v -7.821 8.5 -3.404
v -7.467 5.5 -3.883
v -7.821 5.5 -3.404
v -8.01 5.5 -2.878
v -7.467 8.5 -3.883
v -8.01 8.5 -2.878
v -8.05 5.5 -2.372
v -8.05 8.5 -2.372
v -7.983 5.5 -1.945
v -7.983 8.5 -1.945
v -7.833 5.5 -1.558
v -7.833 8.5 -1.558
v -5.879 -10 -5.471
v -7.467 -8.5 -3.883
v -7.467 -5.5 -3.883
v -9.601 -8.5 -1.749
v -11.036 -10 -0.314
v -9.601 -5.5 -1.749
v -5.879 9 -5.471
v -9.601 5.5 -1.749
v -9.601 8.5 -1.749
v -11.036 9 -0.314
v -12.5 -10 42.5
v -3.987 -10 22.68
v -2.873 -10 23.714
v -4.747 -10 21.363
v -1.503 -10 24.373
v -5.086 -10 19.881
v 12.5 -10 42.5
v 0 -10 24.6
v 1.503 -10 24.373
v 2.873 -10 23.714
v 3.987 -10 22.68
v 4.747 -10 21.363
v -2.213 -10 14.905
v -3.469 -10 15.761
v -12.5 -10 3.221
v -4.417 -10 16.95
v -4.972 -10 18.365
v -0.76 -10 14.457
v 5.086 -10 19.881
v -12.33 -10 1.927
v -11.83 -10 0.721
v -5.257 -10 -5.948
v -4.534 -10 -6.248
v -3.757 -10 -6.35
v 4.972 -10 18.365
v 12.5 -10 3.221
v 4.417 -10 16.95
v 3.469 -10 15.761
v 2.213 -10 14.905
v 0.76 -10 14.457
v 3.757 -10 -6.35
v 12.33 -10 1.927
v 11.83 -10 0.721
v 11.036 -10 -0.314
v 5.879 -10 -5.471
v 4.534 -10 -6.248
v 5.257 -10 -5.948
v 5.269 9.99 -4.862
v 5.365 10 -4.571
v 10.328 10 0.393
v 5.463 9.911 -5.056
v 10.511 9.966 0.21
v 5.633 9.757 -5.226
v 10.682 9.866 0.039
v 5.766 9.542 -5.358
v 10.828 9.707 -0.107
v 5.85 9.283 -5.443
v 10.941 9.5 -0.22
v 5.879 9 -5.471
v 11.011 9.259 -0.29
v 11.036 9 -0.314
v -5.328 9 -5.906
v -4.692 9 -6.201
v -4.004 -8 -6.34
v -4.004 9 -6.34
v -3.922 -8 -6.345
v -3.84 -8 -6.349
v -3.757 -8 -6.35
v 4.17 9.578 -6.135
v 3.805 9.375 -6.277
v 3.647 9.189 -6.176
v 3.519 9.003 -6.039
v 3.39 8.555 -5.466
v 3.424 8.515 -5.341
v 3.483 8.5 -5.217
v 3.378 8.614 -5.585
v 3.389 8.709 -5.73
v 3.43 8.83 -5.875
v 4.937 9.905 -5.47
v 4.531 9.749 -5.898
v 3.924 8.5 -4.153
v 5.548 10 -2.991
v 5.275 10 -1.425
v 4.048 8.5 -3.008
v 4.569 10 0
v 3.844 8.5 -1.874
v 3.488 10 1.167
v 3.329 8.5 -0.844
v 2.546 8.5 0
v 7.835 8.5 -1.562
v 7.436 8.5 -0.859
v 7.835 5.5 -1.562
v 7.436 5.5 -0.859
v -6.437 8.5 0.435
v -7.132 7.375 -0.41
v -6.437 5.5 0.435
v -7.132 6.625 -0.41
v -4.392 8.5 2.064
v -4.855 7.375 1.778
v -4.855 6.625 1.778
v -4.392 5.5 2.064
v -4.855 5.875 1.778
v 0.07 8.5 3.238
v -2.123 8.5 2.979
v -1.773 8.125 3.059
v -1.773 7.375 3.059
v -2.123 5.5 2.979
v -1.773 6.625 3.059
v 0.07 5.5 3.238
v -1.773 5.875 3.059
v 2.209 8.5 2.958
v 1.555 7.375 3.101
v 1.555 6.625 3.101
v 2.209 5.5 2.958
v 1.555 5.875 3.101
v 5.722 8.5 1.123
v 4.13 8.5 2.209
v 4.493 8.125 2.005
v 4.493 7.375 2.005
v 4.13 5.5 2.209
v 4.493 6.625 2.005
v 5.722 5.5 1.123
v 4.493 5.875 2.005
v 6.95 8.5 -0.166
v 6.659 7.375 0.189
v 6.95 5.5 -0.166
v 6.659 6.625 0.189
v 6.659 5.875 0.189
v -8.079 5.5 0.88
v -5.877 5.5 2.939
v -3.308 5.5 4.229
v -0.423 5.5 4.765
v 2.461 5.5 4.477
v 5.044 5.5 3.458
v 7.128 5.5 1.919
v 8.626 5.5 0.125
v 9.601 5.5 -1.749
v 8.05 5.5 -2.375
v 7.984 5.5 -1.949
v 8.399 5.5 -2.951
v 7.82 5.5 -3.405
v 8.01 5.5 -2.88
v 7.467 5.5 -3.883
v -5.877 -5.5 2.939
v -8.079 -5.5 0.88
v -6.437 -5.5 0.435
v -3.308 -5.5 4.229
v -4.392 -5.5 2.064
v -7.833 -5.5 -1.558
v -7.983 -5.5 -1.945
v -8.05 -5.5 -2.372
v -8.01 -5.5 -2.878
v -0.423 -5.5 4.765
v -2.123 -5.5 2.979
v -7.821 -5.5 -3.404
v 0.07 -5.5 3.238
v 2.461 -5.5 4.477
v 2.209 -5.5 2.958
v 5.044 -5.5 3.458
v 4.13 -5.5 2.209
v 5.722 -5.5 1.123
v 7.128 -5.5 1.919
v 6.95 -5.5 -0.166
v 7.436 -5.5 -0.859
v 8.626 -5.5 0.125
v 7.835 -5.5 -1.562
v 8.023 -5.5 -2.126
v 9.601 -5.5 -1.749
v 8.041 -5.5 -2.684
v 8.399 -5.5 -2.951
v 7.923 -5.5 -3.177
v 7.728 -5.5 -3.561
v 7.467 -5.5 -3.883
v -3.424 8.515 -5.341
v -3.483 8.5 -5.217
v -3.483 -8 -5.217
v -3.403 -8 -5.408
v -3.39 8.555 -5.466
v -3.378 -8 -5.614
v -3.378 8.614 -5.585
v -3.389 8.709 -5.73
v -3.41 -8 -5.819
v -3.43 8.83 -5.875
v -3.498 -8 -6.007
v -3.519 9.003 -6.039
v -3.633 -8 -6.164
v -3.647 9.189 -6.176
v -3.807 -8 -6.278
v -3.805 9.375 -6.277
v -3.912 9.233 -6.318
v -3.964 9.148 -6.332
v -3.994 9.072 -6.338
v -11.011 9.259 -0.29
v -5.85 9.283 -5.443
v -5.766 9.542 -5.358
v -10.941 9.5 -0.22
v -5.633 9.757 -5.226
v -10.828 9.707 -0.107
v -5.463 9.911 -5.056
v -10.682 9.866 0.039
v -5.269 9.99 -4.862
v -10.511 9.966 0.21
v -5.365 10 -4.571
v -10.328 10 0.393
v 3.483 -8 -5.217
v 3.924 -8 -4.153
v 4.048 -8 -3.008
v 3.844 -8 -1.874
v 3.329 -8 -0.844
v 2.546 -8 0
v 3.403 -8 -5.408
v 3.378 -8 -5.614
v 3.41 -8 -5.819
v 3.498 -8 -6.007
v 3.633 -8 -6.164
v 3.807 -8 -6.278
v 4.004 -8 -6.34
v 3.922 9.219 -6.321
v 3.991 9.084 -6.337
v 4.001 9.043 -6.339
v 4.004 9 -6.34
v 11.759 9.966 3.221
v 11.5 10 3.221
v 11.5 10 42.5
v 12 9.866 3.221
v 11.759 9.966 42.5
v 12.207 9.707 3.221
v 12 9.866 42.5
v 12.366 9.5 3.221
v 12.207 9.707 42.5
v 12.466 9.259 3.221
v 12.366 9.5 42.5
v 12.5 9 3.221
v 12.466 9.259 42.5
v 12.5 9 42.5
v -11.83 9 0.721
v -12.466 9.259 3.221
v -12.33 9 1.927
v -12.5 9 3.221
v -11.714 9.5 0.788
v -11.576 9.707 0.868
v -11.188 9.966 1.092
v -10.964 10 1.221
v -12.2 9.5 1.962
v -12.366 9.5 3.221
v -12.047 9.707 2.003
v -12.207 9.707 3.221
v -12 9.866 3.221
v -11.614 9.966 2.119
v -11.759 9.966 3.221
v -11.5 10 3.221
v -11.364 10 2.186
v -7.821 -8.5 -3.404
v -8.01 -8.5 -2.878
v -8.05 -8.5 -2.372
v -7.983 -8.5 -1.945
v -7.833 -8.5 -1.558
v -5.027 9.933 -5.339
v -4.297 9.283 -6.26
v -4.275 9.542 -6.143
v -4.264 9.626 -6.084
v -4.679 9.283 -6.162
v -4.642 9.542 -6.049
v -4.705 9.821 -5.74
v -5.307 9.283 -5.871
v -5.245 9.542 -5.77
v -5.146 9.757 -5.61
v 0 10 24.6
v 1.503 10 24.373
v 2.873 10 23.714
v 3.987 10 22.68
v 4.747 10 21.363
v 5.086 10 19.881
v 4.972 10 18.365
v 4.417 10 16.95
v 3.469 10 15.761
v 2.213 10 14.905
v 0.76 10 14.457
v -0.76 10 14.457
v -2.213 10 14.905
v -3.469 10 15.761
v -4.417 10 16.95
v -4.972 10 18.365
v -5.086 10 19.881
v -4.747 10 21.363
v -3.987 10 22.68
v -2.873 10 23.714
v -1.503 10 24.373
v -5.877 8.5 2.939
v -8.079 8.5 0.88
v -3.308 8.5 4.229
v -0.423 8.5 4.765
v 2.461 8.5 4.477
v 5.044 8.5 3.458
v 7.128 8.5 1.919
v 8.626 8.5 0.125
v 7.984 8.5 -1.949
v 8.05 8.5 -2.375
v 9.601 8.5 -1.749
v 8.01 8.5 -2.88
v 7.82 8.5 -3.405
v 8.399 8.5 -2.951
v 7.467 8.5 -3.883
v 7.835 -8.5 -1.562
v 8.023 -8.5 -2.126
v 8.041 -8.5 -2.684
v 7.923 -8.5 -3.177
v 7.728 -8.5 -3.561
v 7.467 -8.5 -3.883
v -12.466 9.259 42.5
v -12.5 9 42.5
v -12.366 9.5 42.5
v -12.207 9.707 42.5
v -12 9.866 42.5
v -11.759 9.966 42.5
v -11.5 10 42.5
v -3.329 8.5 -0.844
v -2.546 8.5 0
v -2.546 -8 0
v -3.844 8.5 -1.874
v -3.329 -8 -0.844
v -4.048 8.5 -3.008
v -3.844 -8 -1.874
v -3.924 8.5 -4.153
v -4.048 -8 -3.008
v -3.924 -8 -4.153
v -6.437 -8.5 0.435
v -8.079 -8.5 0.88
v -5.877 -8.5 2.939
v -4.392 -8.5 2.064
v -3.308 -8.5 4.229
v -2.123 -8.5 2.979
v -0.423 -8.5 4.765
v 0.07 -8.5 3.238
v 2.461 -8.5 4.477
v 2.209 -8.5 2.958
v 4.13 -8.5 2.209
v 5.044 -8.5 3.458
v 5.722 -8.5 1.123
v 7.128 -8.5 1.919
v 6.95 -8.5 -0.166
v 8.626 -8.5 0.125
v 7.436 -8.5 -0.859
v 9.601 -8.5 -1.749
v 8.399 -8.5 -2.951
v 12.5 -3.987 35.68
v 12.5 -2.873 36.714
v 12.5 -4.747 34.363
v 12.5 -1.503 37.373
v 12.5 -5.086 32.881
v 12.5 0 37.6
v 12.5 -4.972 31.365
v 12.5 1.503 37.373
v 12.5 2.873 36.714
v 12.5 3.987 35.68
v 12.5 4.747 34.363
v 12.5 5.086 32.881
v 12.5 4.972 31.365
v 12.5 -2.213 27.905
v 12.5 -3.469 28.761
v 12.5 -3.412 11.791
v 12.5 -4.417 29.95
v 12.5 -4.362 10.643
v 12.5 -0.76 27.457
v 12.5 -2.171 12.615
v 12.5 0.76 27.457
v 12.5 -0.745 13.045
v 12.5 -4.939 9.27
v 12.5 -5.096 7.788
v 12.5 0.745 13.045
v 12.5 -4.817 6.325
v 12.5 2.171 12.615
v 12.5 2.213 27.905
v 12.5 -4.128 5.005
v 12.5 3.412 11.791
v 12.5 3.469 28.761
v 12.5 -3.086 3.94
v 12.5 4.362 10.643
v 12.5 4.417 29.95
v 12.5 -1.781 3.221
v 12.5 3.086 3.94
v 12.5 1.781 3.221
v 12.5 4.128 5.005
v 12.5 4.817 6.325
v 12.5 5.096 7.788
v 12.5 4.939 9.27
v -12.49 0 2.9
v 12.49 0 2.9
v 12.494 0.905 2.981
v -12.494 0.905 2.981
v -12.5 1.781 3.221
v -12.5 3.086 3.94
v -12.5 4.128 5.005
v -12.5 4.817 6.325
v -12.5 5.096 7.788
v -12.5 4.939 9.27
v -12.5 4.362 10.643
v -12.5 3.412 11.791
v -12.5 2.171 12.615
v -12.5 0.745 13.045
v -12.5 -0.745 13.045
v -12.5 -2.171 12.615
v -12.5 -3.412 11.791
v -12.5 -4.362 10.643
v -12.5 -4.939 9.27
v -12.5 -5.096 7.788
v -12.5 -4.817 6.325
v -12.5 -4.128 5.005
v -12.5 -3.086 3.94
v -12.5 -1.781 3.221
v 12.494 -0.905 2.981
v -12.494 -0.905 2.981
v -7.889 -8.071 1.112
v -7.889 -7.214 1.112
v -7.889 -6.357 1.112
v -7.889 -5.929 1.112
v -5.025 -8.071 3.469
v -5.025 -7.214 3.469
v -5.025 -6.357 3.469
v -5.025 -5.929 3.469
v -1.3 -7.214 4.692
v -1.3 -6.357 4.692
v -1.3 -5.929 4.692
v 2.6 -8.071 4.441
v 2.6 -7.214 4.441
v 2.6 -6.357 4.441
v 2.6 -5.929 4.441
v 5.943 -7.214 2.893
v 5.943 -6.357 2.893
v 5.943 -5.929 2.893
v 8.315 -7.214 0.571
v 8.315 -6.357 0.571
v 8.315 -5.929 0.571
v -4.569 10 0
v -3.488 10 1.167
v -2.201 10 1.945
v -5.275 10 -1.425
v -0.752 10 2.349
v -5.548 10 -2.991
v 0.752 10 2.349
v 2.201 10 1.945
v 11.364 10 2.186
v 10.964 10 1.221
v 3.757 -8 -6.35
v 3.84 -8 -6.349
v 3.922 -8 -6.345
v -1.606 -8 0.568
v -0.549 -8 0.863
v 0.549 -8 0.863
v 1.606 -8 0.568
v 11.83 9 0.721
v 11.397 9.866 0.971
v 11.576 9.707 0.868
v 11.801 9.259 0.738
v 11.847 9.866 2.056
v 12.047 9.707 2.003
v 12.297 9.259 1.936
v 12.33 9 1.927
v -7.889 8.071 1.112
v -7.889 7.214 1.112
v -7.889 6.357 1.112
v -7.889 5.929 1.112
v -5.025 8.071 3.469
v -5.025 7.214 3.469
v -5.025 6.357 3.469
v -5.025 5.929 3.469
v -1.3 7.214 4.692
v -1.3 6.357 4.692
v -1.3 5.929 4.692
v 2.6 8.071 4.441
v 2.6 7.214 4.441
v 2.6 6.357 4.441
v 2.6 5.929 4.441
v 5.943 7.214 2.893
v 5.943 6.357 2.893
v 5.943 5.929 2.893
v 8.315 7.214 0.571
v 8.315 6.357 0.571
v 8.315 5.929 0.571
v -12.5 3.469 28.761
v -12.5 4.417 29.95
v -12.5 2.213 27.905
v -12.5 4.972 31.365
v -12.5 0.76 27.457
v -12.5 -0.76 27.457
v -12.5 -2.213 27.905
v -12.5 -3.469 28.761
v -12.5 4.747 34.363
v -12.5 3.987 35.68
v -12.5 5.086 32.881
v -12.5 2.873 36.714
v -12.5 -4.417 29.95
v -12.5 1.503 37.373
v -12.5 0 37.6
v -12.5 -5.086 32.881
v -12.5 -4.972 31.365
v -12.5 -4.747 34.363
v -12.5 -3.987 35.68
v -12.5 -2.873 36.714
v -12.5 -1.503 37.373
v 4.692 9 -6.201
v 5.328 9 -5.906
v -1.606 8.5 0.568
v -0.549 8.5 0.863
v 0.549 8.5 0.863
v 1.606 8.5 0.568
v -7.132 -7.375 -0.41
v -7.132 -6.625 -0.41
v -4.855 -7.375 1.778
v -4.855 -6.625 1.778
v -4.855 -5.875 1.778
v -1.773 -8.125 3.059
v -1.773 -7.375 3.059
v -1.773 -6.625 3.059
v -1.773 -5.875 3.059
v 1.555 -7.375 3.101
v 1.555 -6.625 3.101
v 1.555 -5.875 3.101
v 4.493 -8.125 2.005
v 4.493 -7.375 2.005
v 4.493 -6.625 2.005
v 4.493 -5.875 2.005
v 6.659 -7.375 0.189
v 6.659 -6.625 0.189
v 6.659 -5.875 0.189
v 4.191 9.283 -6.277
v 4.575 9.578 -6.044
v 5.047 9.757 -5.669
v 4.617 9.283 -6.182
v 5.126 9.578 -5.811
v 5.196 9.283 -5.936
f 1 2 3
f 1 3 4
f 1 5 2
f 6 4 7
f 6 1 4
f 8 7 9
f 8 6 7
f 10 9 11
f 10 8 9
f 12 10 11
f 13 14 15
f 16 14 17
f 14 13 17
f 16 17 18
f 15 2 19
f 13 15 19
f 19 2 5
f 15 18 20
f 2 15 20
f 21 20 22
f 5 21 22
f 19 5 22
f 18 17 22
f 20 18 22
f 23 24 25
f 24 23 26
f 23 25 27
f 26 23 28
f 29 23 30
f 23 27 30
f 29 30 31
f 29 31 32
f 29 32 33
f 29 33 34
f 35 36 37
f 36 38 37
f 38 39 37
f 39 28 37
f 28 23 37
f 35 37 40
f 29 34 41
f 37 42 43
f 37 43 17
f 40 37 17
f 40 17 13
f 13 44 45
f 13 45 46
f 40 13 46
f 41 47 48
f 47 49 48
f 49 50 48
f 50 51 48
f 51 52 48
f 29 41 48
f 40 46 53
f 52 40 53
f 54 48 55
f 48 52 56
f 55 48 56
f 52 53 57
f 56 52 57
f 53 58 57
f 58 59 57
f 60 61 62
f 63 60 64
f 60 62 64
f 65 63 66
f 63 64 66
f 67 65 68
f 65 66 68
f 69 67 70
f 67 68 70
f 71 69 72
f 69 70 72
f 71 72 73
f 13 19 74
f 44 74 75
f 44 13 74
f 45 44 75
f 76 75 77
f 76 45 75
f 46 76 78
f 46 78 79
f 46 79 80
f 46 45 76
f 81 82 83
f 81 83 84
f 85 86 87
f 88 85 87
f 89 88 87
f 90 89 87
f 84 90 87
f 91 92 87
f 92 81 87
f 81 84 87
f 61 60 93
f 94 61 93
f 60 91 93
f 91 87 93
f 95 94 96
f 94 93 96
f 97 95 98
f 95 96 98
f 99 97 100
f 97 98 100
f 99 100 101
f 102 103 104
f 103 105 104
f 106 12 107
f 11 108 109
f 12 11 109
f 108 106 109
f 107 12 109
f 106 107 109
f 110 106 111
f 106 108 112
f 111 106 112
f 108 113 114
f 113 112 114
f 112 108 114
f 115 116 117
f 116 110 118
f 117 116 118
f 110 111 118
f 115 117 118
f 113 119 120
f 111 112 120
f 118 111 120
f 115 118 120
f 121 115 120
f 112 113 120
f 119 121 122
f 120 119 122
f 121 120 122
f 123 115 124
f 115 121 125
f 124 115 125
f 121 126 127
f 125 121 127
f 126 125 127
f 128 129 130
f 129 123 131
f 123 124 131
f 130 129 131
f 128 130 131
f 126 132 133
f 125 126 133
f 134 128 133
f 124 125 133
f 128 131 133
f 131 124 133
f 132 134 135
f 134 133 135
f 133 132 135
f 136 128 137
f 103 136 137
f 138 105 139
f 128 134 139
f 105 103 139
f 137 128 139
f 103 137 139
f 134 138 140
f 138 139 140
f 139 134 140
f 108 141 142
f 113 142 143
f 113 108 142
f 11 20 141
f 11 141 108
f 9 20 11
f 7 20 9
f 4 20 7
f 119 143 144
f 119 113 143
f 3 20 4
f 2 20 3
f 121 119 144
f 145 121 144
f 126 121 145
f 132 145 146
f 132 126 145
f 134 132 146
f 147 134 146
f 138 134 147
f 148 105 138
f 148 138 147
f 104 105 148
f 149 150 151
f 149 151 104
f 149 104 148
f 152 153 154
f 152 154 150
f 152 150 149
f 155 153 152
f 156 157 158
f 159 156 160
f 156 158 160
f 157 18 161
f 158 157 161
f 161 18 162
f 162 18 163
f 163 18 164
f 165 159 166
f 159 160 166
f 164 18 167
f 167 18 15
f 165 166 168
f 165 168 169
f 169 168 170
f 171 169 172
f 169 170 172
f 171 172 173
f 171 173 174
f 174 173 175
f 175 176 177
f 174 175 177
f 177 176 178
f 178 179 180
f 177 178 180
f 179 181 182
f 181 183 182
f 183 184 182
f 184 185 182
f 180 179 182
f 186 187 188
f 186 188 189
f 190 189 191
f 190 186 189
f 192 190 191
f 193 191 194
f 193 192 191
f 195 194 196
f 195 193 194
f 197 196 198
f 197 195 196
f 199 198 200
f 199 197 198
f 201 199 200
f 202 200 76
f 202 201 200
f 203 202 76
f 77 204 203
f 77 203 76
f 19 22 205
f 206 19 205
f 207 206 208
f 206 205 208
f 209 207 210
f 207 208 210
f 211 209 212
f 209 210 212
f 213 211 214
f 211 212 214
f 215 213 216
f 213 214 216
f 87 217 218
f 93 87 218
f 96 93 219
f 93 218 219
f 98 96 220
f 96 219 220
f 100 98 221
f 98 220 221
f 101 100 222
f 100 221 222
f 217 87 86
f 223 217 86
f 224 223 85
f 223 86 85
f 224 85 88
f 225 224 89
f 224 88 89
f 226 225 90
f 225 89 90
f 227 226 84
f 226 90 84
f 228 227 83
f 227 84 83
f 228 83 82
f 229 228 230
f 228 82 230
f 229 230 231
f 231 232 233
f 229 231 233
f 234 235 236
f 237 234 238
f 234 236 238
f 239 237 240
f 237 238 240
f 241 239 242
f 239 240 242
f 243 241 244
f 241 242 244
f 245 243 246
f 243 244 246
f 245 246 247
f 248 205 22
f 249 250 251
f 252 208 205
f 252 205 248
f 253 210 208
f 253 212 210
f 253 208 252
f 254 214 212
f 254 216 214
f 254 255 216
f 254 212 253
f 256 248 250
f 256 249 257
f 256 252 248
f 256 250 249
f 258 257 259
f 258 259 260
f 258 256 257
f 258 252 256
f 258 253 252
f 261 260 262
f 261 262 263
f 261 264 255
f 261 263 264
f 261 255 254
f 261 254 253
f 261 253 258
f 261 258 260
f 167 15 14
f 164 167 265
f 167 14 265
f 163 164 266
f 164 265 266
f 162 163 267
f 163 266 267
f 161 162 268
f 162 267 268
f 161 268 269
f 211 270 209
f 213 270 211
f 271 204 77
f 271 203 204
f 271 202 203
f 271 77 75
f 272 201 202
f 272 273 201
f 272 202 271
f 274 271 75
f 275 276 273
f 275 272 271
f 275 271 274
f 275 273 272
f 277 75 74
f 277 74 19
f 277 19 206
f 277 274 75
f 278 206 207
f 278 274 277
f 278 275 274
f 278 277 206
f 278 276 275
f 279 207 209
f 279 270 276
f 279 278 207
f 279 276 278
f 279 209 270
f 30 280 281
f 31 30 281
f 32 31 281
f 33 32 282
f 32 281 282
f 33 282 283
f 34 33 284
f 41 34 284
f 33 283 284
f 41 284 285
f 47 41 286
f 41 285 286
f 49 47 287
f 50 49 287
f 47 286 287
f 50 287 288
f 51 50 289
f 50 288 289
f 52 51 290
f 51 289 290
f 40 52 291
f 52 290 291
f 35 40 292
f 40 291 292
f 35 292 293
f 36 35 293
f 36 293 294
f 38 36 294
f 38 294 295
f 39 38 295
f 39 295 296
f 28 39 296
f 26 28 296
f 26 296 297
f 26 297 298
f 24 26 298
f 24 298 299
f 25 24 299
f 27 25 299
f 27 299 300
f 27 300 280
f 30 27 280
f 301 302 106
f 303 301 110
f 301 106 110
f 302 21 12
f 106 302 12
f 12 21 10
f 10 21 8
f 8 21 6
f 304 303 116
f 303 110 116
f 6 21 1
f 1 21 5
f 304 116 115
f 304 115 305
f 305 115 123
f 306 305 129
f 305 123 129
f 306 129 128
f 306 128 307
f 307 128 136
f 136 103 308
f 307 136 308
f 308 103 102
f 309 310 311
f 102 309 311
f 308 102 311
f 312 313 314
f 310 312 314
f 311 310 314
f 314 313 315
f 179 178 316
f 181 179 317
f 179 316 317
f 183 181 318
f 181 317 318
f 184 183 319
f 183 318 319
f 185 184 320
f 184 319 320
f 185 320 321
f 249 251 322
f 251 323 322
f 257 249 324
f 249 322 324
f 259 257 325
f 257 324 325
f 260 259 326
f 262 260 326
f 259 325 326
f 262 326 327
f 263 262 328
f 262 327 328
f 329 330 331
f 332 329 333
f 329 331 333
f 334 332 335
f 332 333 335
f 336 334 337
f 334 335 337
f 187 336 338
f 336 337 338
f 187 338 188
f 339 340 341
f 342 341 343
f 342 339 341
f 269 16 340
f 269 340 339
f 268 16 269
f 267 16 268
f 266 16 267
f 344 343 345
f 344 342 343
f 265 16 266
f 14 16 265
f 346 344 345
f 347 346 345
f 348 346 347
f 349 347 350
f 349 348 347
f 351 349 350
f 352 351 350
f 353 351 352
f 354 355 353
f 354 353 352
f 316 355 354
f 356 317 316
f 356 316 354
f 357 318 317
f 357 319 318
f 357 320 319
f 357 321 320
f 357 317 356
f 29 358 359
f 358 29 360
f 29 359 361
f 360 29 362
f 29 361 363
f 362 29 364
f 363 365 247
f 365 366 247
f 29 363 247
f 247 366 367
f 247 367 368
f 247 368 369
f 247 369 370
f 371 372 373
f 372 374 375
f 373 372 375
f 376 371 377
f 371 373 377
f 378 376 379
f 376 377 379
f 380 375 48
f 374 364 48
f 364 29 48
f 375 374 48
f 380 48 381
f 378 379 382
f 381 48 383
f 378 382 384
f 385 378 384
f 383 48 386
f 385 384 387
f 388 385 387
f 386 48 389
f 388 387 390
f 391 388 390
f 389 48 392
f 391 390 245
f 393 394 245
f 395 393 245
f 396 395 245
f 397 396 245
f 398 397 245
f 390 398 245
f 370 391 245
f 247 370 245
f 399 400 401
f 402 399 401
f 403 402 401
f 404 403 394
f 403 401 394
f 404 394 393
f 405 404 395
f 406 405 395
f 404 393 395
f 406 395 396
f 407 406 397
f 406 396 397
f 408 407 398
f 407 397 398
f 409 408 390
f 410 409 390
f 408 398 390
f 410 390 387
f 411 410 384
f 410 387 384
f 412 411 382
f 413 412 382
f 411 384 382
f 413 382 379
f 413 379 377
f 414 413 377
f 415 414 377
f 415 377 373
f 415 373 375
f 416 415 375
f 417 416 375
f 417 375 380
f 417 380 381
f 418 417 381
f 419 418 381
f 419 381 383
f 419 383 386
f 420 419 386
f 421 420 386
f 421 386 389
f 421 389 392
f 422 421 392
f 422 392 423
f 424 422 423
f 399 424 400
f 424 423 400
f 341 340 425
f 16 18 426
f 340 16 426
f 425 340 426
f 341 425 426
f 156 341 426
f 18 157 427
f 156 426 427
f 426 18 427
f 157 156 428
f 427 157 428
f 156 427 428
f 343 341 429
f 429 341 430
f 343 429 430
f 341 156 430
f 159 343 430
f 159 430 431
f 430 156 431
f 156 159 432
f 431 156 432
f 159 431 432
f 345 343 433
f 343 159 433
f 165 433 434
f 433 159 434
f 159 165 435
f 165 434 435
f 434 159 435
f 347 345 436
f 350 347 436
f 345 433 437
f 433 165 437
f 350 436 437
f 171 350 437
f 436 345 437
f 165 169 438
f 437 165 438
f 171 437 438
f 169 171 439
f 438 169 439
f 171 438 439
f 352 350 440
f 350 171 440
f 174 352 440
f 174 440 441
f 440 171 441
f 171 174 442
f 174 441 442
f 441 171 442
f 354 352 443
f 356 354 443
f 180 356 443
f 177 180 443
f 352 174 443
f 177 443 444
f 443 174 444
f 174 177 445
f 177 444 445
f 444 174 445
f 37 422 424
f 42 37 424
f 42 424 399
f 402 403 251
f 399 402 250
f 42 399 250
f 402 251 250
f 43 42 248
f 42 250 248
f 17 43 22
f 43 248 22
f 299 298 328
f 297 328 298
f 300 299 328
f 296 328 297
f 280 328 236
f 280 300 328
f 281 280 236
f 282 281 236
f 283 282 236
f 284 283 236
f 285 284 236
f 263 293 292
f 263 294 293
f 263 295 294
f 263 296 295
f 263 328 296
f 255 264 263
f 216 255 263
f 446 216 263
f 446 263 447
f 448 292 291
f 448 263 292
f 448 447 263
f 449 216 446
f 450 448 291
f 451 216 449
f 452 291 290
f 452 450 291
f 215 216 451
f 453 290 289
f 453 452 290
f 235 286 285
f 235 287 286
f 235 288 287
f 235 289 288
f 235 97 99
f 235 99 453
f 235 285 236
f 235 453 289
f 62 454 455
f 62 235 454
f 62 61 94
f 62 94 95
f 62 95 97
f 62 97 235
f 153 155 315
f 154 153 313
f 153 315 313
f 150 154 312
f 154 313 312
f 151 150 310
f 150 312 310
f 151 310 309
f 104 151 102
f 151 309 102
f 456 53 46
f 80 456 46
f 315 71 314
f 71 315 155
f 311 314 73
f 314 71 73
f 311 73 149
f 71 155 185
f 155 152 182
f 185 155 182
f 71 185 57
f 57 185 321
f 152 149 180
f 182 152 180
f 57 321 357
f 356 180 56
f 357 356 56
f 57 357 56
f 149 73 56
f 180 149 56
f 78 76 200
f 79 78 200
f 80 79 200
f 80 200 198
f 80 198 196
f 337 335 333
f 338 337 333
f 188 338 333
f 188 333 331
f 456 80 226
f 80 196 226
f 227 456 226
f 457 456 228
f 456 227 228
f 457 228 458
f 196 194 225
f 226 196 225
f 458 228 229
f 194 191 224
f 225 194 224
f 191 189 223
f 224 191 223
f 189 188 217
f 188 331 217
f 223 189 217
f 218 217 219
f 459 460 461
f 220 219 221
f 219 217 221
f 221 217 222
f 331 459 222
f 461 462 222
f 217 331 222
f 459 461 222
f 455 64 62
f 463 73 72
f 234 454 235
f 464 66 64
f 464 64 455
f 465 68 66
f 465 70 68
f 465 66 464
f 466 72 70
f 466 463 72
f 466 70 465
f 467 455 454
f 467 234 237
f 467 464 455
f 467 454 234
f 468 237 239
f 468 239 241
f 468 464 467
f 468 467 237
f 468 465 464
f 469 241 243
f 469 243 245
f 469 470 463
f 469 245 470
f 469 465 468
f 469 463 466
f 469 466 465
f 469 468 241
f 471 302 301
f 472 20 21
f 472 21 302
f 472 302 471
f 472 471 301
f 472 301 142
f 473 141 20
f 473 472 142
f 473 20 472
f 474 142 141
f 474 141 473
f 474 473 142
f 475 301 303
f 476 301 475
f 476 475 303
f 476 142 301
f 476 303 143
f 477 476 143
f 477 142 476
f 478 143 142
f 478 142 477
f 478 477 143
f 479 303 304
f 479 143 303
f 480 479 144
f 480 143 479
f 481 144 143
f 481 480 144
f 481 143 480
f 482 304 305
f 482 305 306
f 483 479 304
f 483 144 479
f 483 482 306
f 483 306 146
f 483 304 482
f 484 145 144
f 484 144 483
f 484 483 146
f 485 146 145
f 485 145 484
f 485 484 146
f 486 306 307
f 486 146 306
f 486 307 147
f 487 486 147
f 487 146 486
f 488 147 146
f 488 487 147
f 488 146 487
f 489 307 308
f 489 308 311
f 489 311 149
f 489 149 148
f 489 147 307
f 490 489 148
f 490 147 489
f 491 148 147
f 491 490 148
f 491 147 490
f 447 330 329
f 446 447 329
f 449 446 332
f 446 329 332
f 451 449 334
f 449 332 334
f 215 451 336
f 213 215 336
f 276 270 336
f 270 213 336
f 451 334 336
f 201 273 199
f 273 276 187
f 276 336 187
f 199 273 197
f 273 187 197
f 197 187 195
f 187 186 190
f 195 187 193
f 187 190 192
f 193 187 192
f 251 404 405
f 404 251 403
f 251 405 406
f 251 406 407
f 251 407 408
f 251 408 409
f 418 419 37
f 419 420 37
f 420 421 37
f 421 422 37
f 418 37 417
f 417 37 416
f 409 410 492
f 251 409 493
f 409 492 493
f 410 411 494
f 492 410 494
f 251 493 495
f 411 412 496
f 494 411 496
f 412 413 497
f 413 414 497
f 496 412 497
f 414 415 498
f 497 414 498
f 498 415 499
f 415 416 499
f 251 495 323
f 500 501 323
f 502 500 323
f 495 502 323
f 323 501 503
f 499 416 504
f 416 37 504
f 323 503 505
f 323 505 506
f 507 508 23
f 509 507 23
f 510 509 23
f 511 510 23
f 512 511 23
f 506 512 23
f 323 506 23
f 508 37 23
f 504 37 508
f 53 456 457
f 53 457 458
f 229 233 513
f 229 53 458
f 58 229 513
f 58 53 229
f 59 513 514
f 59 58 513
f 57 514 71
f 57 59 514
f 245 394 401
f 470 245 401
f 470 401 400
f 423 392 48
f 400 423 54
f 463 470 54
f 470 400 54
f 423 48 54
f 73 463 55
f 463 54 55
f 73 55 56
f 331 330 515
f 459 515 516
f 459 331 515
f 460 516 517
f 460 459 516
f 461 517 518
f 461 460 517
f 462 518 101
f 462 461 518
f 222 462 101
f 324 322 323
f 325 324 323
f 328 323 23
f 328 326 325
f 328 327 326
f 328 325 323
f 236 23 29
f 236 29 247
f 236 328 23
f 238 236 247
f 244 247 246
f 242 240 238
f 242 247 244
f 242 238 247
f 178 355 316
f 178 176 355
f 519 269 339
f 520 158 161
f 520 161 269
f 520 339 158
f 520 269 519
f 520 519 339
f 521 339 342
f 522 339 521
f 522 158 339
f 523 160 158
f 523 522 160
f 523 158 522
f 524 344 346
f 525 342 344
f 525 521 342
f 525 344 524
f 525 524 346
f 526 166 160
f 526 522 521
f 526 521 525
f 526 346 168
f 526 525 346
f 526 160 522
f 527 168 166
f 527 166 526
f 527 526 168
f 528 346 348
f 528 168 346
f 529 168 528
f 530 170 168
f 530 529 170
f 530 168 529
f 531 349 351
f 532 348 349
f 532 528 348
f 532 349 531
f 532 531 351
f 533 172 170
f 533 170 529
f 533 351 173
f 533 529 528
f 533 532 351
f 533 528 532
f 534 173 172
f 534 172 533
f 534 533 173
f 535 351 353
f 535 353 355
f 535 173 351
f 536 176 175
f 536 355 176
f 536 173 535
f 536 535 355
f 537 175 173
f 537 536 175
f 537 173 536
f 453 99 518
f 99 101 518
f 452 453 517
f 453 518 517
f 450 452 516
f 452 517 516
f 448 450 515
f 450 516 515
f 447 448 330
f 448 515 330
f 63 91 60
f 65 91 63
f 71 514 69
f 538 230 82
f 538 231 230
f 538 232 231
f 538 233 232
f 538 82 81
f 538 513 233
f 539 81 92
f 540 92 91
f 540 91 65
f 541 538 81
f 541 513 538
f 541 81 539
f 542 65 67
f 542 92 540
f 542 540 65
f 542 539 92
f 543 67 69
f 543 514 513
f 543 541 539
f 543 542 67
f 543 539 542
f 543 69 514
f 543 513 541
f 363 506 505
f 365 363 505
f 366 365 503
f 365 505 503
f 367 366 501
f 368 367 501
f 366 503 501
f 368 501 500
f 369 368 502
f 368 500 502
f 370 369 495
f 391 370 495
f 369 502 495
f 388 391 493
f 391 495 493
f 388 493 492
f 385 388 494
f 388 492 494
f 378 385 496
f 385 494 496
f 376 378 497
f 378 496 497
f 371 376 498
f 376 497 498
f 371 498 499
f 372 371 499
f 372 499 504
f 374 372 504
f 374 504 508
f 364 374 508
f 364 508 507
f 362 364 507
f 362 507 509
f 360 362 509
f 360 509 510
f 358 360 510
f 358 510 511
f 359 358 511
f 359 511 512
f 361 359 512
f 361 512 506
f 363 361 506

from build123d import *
from OCP.BRepAlgoAPI import BRepAlgoAPI_Cut
from OCP.TopTools import TopTools_ListOfShape

# Parameters (mm, degrees)
SZKIC1_W                               = 25
SZKIC1_H                               = 20
DODANIE_WYCI_GNI_CIE1_DEPTH            = 42.5
WYTNIJ_WYCI_GNI_CIE1_REACH             = 52.312
SZKIC2_R                               = 5.1
WYTNIJ_WYCI_GNI_CIE2_REACH             = 50.606
SZKIC3_R                               = 5.1
DODANIE_WYCI_GNI_CIE2_START            = -20
DODANIE_WYCI_GNI_CIE2_DEPTH            = 20
ZAOKR_GLENIE2_R                        = 0.75
SZKIC7_W                               = 25
SZKIC7_H                               = 15
DODANIE_WYCI_GNI_CIE3_DEPTH            = 2
WYTNIJ_WYCI_GNI_CIE4_REACH             = 49.817
SZKIC8_R                               = 4.05
SFAZOWANIE1_SIZE                       = 7.5
WYCI_CIE_WYCI_GNI_CIE_START            = 5.5
WYCI_CIE_WYCI_GNI_CIE_PO_CIE_CE1_DEPTH = 3
ZAOKR_GLENIE3_R                        = 2
ZAOKR_GLENIE4_START                    = -11
ZAOKR_GLENIE4_DEPTH                    = 22
ZAOKR_GLENIE3_OF_LUSTRO2_R             = 2
ZAOKR_GLENIE5_R                        = 5
ZAOKR_GLENIE6_R                        = 1
SFAZOWANIE2_SIZE                       = 1.5
WYTNIJ_WYCI_GNI_CIE5_REACH             = 52.312
SZKIC12_R                              = 5.1


with BuildPart() as part:
    # Szkic1 → Dodanie-wyciągnięcie1 (new body)
    with BuildSketch(Plane.XY):
        Rectangle(SZKIC1_W, SZKIC1_H)
    extrude(amount=DODANIE_WYCI_GNI_CIE1_DEPTH)

    # Szkic2 → Wytnij-wyciągnięcie1 (cut, up to next)
    with BuildSketch(Plane(origin=(12.5, 0, 0), x_dir=(0, 0, -1), z_dir=(1, 0, 0)), mode=Mode.PRIVATE) as wytnij_wyci_gni_cie1_sk1:
        with Locations((-8, 0)):
            Circle(SZKIC2_R)
    wytnij_wyci_gni_cie1_tool1 = extrude(wytnij_wyci_gni_cie1_sk1.sketch, amount=-WYTNIJ_WYCI_GNI_CIE1_REACH, mode=Mode.PRIVATE) & part.part
    add(wytnij_wyci_gni_cie1_tool1.solids().sort_by_distance((12.5, 0, 8))[0], mode=Mode.SUBTRACT)

    # Szkic3 → Wytnij-wyciągnięcie2 (cut, up to next)
    with BuildSketch(Plane(origin=(0, 10, 0), x_dir=(1, 0, 0), z_dir=(0, 1, 0)), mode=Mode.PRIVATE) as wytnij_wyci_gni_cie2_sk1:
        with Locations(Location((0, -19.5, 0), (0, 0, 270))):
            Circle(SZKIC3_R)
    wytnij_wyci_gni_cie2_tool1 = extrude(wytnij_wyci_gni_cie2_sk1.sketch, amount=-WYTNIJ_WYCI_GNI_CIE2_REACH, mode=Mode.PRIVATE) & part.part
    add(wytnij_wyci_gni_cie2_tool1.solids().sort_by_distance((0, 10, 19.5))[0], mode=Mode.SUBTRACT)

    # Dodanie-wyciągnięcie2: read off the stored shape, not the designer's step
    # Dodanie-wyciągnięcie2 outline → Dodanie-wyciągnięcie2 (add)
    with BuildSketch(Plane(origin=(0, 10, 0), x_dir=(1, 0, 0), z_dir=(0, 1, 0)).offset(DODANIE_WYCI_GNI_CIE2_START)):
        with BuildLine():
            Line((-12.5, 0), (-2.545584412, 0))
            ThreePointArc((-2.545584412, 0), (-4.049799766, 3.19027229), (-2.482438317, 6.35))
            Line((-2.482438317, 6.35), (-12.5, 6.35))
            Line((-12.5, 6.35), (-12.5, 0))
        make_face()
        with BuildLine():
            Line((12.5, 0), (12.5, 6.35))
            Line((12.5, 6.35), (2.482438317, 6.35))
            ThreePointArc((2.482438317, 6.35), (4.049799766, 3.19027229), (2.545584412, 0))
            Line((2.545584412, 0), (12.5, 0))
        make_face()
    extrude(amount=DODANIE_WYCI_GNI_CIE2_DEPTH)

    # Zaokrąglenie2
    zaokr_glenie2_edges = [part.edges().sort_by_distance(p)[0] for p in [
        (-2.482438317, 0, -6.35),
        (2.482438317, 0, -6.35),
    ]]
    fillet(zaokr_glenie2_edges, radius=ZAOKR_GLENIE2_R)

    # Szkic7 → Dodanie-wyciągnięcie3 (add)
    with BuildSketch(Plane.XZ.offset(10)):
        with Locations((0, 1.15)):
            Rectangle(SZKIC7_W, SZKIC7_H)
    extrude(amount=-DODANIE_WYCI_GNI_CIE3_DEPTH)

    # Szkic8 → Wytnij-wyciągnięcie4 (cut, up to next)
    with BuildSketch(Plane(origin=(0, -8, 0), x_dir=(1, 0, 0), z_dir=(0, 1, 0)), mode=Mode.PRIVATE) as wytnij_wyci_gni_cie4_sk1:
        with Locations((0, 3.15)):
            Circle(SZKIC8_R)
    wytnij_wyci_gni_cie4_tool1 = extrude(wytnij_wyci_gni_cie4_sk1.sketch, amount=WYTNIJ_WYCI_GNI_CIE4_REACH, mode=Mode.PRIVATE) & part.part
    add(wytnij_wyci_gni_cie4_tool1.solids().sort_by_distance((0, -8, -3.15))[0], mode=Mode.SUBTRACT)

    # Sfazowanie1
    sfazowanie1_edges = [part.edges().sort_by_distance(p)[0] for p in [
        (-12.5, 0, -6.35),
        (12.5, 0, -6.35),
    ]]
    chamfer(sfazowanie1_edges, length=SFAZOWANIE1_SIZE)


with BuildPart() as wyci_cie_wyci_gni_cie_po_cie_ce1_tool:
    # Wycięcie-wyciągnięcie po ścieżce1: read off the stored shape, not the designer's step
    # Wycięcie-wyciągnięcie po ścieżce1 outlin → Wycięcie-wyciągnięcie po ścieżce1 (new body)
    with BuildSketch(Plane(origin=(0, 0, 0), x_dir=(1, 0, 0), z_dir=(0, 1, 0)).offset(WYCI_CIE_WYCI_GNI_CIE_START)):
        with BuildLine():
            Line((-8.398959236, 2.951040764), (-9.601040764, 1.748959236))
            add(Edge.make_bspline(
                [(-9.601040764, 1.748959236), (-9.209595956, 0.772190109), (-8.65567701, -0.205079485), (-7.121419805, -2.018854383), (-6.15542851, -2.840889353), (-3.89496705, -4.097344098), (-2.618886758, -4.525976788), (0.018436022, -4.858092268), (1.356613032, -4.766181401), (3.844325913, -4.116700841), (4.978679647, -3.572124587), (6.907257886, -2.213562211), (7.697476445, -1.410485572), (8.875702434, 0.189942932), (9.295310391, 0.978883557), (9.600922152, 1.74907375)],
                knots=[0.044527741, 0.044527741, 0.044527741, 0.044527741, 0.163961774, 0.163961774, 0.283395806, 0.283395806, 0.402829838, 0.402829838, 0.522263871, 0.522263871, 0.641697903, 0.641697903, 0.761131935, 0.761131935, 0.869411924, 0.869411924, 0.869411924, 0.869411924], degree=3))
            Line((9.600922152, 1.74907375), (8.398612397, 2.951387603))
            add(Edge.make_bspline(
                [(-8.398959236, 2.951040764), (-8.143623085, 2.110383322), (-7.721254142, 1.22892436), (-6.543030407, -0.407961014), (-5.768609422, -1.171170966), (-3.942260695, -2.384057538), (-2.87593166, -2.830554933), (-0.670426419, -3.287743264), (0.481400093, -3.292782379), (2.627656604, -2.909796026), (3.631791424, -2.516326215), (5.35458893, -1.493813298), (6.079684963, -0.860499), (7.238136236, 0.482263814), (7.674817273, 1.192485201), (8.155489955, 2.24471168), (8.28334822, 2.593485223), (8.398612397, 2.951387603)],
                knots=[0.044527741, 0.044527741, 0.044527741, 0.044527741, 0.163961774, 0.163961774, 0.283395806, 0.283395806, 0.402829838, 0.402829838, 0.522263871, 0.522263871, 0.641697903, 0.641697903, 0.761131935, 0.761131935, 0.880565968, 0.880565968, 0.940774458, 0.940774458, 0.940774458, 0.940774458], degree=3))
        make_face()
    wyci_cie_wyci_gni_cie_po_cie_ce1 = extrude(amount=WYCI_CIE_WYCI_GNI_CIE_PO_CIE_CE1_DEPTH)


with BuildPart() as part_1:
    add(part.part)

    # Wycięcie-wyciągnięcie po ścieżce1: cut by wyci_cie_wyci_gni_cie_po_cie_ce1_tool, with a tolerance
    wyci_cie_wyci_gni_cie_po_cie_ce1_stock = TopTools_ListOfShape()
    wyci_cie_wyci_gni_cie_po_cie_ce1_stock.Append(part_1.part.wrapped)
    wyci_cie_wyci_gni_cie_po_cie_ce1_tools = TopTools_ListOfShape()
    wyci_cie_wyci_gni_cie_po_cie_ce1_tools.Append(wyci_cie_wyci_gni_cie_po_cie_ce1_tool.part.wrapped)
    wyci_cie_wyci_gni_cie_po_cie_ce1_cut = BRepAlgoAPI_Cut()
    wyci_cie_wyci_gni_cie_po_cie_ce1_cut.SetArguments(wyci_cie_wyci_gni_cie_po_cie_ce1_stock)
    wyci_cie_wyci_gni_cie_po_cie_ce1_cut.SetTools(wyci_cie_wyci_gni_cie_po_cie_ce1_tools)
    wyci_cie_wyci_gni_cie_po_cie_ce1_cut.SetFuzzyValue(0.00001)
    wyci_cie_wyci_gni_cie_po_cie_ce1_cut.Build()
    add(Compound.cast(wyci_cie_wyci_gni_cie_po_cie_ce1_cut.Shape()).solids(), mode=Mode.REPLACE)

    # Zaokrąglenie3
    zaokr_glenie3_edges = [part_1.edges().sort_by_distance(p)[0] for p in [
        (-8.398959236, 7, -2.951040764),
        (8.398612397, 7, -2.951387603),
    ]]
    fillet(zaokr_glenie3_edges, radius=ZAOKR_GLENIE3_R)

    # Zaokrąglenie4: read off the stored shape, not the designer's step
    # Zaokrąglenie4 outline → Zaokrąglenie4 (cut)
    with BuildSketch(Plane(origin=(0, 0, 0), x_dir=(1, 0, 0), z_dir=(0, 1, 0)).offset(ZAOKR_GLENIE4_START)):
        with BuildLine():
            Line((5, 6.35), (3.757359313, 6.35))
            ThreePointArc((3.757359313, 6.35), (4.90540961, 6.121638598), (5.878679656, 5.471320344))
            Line((5.878679656, 5.471320344), (5, 6.35))
        make_face()
        with BuildLine():
            ThreePointArc((-5.878679656, 5.471320344), (-4.90540961, 6.121638598), (-3.757359313, 6.35))
            Line((-3.757359313, 6.35), (-5, 6.35))
            Line((-5, 6.35), (-5.878679656, 5.471320344))
        make_face()
    extrude(amount=ZAOKR_GLENIE4_DEPTH, mode=Mode.SUBTRACT)

    # Lustro2: Wycięcie-wyciągnięcie po ścieżce1 across plane
    add(wyci_cie_wyci_gni_cie_po_cie_ce1.mirror(Plane.ZX), mode=Mode.SUBTRACT)

    # Zaokrąglenie3 of Lustro2
    zaokr_glenie3_of_lustro2_edges = [part_1.edges().sort_by_distance(p)[0] for p in [
        (-8.398959236, -7, -2.951040764),
        (8.398612397, -7, -2.951387603),
    ]]
    fillet(zaokr_glenie3_of_lustro2_edges, radius=ZAOKR_GLENIE3_OF_LUSTRO2_R)

    # Zaokrąglenie5
    # the kernel refuses this fillet: 5 mm, written as the material it takes off along each edge
    with BuildSketch(Plane(origin=(-12.5, 15.17766953, 1.15), x_dir=(0.7071067811865477, 0, -0.7071067811865472), z_dir=(0, -1, 0)), Plane(origin=(12.5, -15.17766953, 1.15), x_dir=(-0.7071067811865474, 0, -0.7071067811865476), z_dir=(0, 1, 0))) as zaokr_glenie5_piece_1:
        with BuildLine():
            CenterArc((ZAOKR_GLENIE5_R * 0.414213562373, ZAOKR_GLENIE5_R), ZAOKR_GLENIE5_R, 225, 45)
            Line((-ZAOKR_GLENIE5_R * 0.292893218813, ZAOKR_GLENIE5_R * 0.292893218813), (0, 0))
            Line((0, 0), (ZAOKR_GLENIE5_R * 0.414213562373, 0))
        make_face()
    extrude(amount=30.355339059, mode=Mode.SUBTRACT)

    # Zaokrąglenie6
    zaokr_glenie6_edges = [part_1.edges().sort_by_distance(p)[0] for p in [
        (-8.457106781, 10, -2.892893219),
        (-5.01866332, 10, -6.071968443),
        (5.01866332, 10, -6.071968443),
        (8.457106781, 10, -2.892893219),
        (12.119397663, 10, 1.30765065),
        (-12.119397663, 10, 1.30765065),
        (-12.5, 10, 22.860533906),
        (12.5, 10, 22.860533906),
    ]]
    fillet(zaokr_glenie6_edges, radius=ZAOKR_GLENIE6_R)

    # Sfazowanie2
    # the kernel refuses this chamfer: 1.5 mm, written as the material it takes off along each edge
    with BuildSketch(Plane(origin=(1e-09, 10, -3.15), x_dir=(0.08224322624349094, 0, -0.9966122875707795), z_dir=(-0.9966122875707795, 0, -0.08224322624349094))) as sfazowanie2_piece_1:
        Polygon((4.049999999 + SFAZOWANIE2_SIZE, 0), (4.049999999, SFAZOWANIE2_SIZE), (4.049999999, 0), align=None)
    revolve(axis=Axis((1e-09, 10, -3.15), (0, -1, 0)), revolution_arc=136.340040588, mode=Mode.SUBTRACT)
    with BuildSketch(Plane(origin=(-1e-09, 10, -3.15), x_dir=(-0.6285393608328834, 0, 0.7777777779570398), z_dir=(0.7777777779570398, 0, 0.6285393608328834))) as sfazowanie2_piece_2:
        Polygon((4.049999999 + SFAZOWANIE2_SIZE, 0), (4.049999999, SFAZOWANIE2_SIZE), (4.049999999, 0), align=None)
    revolve(axis=Axis((-1e-09, 10, -3.15), (0, -1, 0)), revolution_arc=136.340040588, mode=Mode.SUBTRACT)
    with BuildSketch(Plane(origin=(0, 10, -3.15), x_dir=(0.6285393610141453, 0, 0.7777777778105581), z_dir=(0.7777777778105581, 0, -0.6285393610141453))) as sfazowanie2_piece_3:
        Polygon((4.05 + SFAZOWANIE2_SIZE, 0), (4.05, SFAZOWANIE2_SIZE), (4.05, 0), align=None)
    revolve(axis=Axis((0, 10, -3.15), (0, -1, 0)), revolution_arc=77.884882532, mode=Mode.SUBTRACT)

    # Szkic12 → Wytnij-wyciągnięcie5 (cut, up to next)
    with BuildSketch(Plane.ZY.offset(12.5), mode=Mode.PRIVATE) as wytnij_wyci_gni_cie5_sk1:
        with Locations((32.5, 0)):
            Circle(SZKIC12_R)
    wytnij_wyci_gni_cie5_tool1 = extrude(wytnij_wyci_gni_cie5_sk1.sketch, amount=-WYTNIJ_WYCI_GNI_CIE5_REACH, mode=Mode.PRIVATE) & part_1.part
    add(wytnij_wyci_gni_cie5_tool1.solids().sort_by_distance((-12.5, 0, 32.5))[0], mode=Mode.SUBTRACT)


solid = part_1.part
